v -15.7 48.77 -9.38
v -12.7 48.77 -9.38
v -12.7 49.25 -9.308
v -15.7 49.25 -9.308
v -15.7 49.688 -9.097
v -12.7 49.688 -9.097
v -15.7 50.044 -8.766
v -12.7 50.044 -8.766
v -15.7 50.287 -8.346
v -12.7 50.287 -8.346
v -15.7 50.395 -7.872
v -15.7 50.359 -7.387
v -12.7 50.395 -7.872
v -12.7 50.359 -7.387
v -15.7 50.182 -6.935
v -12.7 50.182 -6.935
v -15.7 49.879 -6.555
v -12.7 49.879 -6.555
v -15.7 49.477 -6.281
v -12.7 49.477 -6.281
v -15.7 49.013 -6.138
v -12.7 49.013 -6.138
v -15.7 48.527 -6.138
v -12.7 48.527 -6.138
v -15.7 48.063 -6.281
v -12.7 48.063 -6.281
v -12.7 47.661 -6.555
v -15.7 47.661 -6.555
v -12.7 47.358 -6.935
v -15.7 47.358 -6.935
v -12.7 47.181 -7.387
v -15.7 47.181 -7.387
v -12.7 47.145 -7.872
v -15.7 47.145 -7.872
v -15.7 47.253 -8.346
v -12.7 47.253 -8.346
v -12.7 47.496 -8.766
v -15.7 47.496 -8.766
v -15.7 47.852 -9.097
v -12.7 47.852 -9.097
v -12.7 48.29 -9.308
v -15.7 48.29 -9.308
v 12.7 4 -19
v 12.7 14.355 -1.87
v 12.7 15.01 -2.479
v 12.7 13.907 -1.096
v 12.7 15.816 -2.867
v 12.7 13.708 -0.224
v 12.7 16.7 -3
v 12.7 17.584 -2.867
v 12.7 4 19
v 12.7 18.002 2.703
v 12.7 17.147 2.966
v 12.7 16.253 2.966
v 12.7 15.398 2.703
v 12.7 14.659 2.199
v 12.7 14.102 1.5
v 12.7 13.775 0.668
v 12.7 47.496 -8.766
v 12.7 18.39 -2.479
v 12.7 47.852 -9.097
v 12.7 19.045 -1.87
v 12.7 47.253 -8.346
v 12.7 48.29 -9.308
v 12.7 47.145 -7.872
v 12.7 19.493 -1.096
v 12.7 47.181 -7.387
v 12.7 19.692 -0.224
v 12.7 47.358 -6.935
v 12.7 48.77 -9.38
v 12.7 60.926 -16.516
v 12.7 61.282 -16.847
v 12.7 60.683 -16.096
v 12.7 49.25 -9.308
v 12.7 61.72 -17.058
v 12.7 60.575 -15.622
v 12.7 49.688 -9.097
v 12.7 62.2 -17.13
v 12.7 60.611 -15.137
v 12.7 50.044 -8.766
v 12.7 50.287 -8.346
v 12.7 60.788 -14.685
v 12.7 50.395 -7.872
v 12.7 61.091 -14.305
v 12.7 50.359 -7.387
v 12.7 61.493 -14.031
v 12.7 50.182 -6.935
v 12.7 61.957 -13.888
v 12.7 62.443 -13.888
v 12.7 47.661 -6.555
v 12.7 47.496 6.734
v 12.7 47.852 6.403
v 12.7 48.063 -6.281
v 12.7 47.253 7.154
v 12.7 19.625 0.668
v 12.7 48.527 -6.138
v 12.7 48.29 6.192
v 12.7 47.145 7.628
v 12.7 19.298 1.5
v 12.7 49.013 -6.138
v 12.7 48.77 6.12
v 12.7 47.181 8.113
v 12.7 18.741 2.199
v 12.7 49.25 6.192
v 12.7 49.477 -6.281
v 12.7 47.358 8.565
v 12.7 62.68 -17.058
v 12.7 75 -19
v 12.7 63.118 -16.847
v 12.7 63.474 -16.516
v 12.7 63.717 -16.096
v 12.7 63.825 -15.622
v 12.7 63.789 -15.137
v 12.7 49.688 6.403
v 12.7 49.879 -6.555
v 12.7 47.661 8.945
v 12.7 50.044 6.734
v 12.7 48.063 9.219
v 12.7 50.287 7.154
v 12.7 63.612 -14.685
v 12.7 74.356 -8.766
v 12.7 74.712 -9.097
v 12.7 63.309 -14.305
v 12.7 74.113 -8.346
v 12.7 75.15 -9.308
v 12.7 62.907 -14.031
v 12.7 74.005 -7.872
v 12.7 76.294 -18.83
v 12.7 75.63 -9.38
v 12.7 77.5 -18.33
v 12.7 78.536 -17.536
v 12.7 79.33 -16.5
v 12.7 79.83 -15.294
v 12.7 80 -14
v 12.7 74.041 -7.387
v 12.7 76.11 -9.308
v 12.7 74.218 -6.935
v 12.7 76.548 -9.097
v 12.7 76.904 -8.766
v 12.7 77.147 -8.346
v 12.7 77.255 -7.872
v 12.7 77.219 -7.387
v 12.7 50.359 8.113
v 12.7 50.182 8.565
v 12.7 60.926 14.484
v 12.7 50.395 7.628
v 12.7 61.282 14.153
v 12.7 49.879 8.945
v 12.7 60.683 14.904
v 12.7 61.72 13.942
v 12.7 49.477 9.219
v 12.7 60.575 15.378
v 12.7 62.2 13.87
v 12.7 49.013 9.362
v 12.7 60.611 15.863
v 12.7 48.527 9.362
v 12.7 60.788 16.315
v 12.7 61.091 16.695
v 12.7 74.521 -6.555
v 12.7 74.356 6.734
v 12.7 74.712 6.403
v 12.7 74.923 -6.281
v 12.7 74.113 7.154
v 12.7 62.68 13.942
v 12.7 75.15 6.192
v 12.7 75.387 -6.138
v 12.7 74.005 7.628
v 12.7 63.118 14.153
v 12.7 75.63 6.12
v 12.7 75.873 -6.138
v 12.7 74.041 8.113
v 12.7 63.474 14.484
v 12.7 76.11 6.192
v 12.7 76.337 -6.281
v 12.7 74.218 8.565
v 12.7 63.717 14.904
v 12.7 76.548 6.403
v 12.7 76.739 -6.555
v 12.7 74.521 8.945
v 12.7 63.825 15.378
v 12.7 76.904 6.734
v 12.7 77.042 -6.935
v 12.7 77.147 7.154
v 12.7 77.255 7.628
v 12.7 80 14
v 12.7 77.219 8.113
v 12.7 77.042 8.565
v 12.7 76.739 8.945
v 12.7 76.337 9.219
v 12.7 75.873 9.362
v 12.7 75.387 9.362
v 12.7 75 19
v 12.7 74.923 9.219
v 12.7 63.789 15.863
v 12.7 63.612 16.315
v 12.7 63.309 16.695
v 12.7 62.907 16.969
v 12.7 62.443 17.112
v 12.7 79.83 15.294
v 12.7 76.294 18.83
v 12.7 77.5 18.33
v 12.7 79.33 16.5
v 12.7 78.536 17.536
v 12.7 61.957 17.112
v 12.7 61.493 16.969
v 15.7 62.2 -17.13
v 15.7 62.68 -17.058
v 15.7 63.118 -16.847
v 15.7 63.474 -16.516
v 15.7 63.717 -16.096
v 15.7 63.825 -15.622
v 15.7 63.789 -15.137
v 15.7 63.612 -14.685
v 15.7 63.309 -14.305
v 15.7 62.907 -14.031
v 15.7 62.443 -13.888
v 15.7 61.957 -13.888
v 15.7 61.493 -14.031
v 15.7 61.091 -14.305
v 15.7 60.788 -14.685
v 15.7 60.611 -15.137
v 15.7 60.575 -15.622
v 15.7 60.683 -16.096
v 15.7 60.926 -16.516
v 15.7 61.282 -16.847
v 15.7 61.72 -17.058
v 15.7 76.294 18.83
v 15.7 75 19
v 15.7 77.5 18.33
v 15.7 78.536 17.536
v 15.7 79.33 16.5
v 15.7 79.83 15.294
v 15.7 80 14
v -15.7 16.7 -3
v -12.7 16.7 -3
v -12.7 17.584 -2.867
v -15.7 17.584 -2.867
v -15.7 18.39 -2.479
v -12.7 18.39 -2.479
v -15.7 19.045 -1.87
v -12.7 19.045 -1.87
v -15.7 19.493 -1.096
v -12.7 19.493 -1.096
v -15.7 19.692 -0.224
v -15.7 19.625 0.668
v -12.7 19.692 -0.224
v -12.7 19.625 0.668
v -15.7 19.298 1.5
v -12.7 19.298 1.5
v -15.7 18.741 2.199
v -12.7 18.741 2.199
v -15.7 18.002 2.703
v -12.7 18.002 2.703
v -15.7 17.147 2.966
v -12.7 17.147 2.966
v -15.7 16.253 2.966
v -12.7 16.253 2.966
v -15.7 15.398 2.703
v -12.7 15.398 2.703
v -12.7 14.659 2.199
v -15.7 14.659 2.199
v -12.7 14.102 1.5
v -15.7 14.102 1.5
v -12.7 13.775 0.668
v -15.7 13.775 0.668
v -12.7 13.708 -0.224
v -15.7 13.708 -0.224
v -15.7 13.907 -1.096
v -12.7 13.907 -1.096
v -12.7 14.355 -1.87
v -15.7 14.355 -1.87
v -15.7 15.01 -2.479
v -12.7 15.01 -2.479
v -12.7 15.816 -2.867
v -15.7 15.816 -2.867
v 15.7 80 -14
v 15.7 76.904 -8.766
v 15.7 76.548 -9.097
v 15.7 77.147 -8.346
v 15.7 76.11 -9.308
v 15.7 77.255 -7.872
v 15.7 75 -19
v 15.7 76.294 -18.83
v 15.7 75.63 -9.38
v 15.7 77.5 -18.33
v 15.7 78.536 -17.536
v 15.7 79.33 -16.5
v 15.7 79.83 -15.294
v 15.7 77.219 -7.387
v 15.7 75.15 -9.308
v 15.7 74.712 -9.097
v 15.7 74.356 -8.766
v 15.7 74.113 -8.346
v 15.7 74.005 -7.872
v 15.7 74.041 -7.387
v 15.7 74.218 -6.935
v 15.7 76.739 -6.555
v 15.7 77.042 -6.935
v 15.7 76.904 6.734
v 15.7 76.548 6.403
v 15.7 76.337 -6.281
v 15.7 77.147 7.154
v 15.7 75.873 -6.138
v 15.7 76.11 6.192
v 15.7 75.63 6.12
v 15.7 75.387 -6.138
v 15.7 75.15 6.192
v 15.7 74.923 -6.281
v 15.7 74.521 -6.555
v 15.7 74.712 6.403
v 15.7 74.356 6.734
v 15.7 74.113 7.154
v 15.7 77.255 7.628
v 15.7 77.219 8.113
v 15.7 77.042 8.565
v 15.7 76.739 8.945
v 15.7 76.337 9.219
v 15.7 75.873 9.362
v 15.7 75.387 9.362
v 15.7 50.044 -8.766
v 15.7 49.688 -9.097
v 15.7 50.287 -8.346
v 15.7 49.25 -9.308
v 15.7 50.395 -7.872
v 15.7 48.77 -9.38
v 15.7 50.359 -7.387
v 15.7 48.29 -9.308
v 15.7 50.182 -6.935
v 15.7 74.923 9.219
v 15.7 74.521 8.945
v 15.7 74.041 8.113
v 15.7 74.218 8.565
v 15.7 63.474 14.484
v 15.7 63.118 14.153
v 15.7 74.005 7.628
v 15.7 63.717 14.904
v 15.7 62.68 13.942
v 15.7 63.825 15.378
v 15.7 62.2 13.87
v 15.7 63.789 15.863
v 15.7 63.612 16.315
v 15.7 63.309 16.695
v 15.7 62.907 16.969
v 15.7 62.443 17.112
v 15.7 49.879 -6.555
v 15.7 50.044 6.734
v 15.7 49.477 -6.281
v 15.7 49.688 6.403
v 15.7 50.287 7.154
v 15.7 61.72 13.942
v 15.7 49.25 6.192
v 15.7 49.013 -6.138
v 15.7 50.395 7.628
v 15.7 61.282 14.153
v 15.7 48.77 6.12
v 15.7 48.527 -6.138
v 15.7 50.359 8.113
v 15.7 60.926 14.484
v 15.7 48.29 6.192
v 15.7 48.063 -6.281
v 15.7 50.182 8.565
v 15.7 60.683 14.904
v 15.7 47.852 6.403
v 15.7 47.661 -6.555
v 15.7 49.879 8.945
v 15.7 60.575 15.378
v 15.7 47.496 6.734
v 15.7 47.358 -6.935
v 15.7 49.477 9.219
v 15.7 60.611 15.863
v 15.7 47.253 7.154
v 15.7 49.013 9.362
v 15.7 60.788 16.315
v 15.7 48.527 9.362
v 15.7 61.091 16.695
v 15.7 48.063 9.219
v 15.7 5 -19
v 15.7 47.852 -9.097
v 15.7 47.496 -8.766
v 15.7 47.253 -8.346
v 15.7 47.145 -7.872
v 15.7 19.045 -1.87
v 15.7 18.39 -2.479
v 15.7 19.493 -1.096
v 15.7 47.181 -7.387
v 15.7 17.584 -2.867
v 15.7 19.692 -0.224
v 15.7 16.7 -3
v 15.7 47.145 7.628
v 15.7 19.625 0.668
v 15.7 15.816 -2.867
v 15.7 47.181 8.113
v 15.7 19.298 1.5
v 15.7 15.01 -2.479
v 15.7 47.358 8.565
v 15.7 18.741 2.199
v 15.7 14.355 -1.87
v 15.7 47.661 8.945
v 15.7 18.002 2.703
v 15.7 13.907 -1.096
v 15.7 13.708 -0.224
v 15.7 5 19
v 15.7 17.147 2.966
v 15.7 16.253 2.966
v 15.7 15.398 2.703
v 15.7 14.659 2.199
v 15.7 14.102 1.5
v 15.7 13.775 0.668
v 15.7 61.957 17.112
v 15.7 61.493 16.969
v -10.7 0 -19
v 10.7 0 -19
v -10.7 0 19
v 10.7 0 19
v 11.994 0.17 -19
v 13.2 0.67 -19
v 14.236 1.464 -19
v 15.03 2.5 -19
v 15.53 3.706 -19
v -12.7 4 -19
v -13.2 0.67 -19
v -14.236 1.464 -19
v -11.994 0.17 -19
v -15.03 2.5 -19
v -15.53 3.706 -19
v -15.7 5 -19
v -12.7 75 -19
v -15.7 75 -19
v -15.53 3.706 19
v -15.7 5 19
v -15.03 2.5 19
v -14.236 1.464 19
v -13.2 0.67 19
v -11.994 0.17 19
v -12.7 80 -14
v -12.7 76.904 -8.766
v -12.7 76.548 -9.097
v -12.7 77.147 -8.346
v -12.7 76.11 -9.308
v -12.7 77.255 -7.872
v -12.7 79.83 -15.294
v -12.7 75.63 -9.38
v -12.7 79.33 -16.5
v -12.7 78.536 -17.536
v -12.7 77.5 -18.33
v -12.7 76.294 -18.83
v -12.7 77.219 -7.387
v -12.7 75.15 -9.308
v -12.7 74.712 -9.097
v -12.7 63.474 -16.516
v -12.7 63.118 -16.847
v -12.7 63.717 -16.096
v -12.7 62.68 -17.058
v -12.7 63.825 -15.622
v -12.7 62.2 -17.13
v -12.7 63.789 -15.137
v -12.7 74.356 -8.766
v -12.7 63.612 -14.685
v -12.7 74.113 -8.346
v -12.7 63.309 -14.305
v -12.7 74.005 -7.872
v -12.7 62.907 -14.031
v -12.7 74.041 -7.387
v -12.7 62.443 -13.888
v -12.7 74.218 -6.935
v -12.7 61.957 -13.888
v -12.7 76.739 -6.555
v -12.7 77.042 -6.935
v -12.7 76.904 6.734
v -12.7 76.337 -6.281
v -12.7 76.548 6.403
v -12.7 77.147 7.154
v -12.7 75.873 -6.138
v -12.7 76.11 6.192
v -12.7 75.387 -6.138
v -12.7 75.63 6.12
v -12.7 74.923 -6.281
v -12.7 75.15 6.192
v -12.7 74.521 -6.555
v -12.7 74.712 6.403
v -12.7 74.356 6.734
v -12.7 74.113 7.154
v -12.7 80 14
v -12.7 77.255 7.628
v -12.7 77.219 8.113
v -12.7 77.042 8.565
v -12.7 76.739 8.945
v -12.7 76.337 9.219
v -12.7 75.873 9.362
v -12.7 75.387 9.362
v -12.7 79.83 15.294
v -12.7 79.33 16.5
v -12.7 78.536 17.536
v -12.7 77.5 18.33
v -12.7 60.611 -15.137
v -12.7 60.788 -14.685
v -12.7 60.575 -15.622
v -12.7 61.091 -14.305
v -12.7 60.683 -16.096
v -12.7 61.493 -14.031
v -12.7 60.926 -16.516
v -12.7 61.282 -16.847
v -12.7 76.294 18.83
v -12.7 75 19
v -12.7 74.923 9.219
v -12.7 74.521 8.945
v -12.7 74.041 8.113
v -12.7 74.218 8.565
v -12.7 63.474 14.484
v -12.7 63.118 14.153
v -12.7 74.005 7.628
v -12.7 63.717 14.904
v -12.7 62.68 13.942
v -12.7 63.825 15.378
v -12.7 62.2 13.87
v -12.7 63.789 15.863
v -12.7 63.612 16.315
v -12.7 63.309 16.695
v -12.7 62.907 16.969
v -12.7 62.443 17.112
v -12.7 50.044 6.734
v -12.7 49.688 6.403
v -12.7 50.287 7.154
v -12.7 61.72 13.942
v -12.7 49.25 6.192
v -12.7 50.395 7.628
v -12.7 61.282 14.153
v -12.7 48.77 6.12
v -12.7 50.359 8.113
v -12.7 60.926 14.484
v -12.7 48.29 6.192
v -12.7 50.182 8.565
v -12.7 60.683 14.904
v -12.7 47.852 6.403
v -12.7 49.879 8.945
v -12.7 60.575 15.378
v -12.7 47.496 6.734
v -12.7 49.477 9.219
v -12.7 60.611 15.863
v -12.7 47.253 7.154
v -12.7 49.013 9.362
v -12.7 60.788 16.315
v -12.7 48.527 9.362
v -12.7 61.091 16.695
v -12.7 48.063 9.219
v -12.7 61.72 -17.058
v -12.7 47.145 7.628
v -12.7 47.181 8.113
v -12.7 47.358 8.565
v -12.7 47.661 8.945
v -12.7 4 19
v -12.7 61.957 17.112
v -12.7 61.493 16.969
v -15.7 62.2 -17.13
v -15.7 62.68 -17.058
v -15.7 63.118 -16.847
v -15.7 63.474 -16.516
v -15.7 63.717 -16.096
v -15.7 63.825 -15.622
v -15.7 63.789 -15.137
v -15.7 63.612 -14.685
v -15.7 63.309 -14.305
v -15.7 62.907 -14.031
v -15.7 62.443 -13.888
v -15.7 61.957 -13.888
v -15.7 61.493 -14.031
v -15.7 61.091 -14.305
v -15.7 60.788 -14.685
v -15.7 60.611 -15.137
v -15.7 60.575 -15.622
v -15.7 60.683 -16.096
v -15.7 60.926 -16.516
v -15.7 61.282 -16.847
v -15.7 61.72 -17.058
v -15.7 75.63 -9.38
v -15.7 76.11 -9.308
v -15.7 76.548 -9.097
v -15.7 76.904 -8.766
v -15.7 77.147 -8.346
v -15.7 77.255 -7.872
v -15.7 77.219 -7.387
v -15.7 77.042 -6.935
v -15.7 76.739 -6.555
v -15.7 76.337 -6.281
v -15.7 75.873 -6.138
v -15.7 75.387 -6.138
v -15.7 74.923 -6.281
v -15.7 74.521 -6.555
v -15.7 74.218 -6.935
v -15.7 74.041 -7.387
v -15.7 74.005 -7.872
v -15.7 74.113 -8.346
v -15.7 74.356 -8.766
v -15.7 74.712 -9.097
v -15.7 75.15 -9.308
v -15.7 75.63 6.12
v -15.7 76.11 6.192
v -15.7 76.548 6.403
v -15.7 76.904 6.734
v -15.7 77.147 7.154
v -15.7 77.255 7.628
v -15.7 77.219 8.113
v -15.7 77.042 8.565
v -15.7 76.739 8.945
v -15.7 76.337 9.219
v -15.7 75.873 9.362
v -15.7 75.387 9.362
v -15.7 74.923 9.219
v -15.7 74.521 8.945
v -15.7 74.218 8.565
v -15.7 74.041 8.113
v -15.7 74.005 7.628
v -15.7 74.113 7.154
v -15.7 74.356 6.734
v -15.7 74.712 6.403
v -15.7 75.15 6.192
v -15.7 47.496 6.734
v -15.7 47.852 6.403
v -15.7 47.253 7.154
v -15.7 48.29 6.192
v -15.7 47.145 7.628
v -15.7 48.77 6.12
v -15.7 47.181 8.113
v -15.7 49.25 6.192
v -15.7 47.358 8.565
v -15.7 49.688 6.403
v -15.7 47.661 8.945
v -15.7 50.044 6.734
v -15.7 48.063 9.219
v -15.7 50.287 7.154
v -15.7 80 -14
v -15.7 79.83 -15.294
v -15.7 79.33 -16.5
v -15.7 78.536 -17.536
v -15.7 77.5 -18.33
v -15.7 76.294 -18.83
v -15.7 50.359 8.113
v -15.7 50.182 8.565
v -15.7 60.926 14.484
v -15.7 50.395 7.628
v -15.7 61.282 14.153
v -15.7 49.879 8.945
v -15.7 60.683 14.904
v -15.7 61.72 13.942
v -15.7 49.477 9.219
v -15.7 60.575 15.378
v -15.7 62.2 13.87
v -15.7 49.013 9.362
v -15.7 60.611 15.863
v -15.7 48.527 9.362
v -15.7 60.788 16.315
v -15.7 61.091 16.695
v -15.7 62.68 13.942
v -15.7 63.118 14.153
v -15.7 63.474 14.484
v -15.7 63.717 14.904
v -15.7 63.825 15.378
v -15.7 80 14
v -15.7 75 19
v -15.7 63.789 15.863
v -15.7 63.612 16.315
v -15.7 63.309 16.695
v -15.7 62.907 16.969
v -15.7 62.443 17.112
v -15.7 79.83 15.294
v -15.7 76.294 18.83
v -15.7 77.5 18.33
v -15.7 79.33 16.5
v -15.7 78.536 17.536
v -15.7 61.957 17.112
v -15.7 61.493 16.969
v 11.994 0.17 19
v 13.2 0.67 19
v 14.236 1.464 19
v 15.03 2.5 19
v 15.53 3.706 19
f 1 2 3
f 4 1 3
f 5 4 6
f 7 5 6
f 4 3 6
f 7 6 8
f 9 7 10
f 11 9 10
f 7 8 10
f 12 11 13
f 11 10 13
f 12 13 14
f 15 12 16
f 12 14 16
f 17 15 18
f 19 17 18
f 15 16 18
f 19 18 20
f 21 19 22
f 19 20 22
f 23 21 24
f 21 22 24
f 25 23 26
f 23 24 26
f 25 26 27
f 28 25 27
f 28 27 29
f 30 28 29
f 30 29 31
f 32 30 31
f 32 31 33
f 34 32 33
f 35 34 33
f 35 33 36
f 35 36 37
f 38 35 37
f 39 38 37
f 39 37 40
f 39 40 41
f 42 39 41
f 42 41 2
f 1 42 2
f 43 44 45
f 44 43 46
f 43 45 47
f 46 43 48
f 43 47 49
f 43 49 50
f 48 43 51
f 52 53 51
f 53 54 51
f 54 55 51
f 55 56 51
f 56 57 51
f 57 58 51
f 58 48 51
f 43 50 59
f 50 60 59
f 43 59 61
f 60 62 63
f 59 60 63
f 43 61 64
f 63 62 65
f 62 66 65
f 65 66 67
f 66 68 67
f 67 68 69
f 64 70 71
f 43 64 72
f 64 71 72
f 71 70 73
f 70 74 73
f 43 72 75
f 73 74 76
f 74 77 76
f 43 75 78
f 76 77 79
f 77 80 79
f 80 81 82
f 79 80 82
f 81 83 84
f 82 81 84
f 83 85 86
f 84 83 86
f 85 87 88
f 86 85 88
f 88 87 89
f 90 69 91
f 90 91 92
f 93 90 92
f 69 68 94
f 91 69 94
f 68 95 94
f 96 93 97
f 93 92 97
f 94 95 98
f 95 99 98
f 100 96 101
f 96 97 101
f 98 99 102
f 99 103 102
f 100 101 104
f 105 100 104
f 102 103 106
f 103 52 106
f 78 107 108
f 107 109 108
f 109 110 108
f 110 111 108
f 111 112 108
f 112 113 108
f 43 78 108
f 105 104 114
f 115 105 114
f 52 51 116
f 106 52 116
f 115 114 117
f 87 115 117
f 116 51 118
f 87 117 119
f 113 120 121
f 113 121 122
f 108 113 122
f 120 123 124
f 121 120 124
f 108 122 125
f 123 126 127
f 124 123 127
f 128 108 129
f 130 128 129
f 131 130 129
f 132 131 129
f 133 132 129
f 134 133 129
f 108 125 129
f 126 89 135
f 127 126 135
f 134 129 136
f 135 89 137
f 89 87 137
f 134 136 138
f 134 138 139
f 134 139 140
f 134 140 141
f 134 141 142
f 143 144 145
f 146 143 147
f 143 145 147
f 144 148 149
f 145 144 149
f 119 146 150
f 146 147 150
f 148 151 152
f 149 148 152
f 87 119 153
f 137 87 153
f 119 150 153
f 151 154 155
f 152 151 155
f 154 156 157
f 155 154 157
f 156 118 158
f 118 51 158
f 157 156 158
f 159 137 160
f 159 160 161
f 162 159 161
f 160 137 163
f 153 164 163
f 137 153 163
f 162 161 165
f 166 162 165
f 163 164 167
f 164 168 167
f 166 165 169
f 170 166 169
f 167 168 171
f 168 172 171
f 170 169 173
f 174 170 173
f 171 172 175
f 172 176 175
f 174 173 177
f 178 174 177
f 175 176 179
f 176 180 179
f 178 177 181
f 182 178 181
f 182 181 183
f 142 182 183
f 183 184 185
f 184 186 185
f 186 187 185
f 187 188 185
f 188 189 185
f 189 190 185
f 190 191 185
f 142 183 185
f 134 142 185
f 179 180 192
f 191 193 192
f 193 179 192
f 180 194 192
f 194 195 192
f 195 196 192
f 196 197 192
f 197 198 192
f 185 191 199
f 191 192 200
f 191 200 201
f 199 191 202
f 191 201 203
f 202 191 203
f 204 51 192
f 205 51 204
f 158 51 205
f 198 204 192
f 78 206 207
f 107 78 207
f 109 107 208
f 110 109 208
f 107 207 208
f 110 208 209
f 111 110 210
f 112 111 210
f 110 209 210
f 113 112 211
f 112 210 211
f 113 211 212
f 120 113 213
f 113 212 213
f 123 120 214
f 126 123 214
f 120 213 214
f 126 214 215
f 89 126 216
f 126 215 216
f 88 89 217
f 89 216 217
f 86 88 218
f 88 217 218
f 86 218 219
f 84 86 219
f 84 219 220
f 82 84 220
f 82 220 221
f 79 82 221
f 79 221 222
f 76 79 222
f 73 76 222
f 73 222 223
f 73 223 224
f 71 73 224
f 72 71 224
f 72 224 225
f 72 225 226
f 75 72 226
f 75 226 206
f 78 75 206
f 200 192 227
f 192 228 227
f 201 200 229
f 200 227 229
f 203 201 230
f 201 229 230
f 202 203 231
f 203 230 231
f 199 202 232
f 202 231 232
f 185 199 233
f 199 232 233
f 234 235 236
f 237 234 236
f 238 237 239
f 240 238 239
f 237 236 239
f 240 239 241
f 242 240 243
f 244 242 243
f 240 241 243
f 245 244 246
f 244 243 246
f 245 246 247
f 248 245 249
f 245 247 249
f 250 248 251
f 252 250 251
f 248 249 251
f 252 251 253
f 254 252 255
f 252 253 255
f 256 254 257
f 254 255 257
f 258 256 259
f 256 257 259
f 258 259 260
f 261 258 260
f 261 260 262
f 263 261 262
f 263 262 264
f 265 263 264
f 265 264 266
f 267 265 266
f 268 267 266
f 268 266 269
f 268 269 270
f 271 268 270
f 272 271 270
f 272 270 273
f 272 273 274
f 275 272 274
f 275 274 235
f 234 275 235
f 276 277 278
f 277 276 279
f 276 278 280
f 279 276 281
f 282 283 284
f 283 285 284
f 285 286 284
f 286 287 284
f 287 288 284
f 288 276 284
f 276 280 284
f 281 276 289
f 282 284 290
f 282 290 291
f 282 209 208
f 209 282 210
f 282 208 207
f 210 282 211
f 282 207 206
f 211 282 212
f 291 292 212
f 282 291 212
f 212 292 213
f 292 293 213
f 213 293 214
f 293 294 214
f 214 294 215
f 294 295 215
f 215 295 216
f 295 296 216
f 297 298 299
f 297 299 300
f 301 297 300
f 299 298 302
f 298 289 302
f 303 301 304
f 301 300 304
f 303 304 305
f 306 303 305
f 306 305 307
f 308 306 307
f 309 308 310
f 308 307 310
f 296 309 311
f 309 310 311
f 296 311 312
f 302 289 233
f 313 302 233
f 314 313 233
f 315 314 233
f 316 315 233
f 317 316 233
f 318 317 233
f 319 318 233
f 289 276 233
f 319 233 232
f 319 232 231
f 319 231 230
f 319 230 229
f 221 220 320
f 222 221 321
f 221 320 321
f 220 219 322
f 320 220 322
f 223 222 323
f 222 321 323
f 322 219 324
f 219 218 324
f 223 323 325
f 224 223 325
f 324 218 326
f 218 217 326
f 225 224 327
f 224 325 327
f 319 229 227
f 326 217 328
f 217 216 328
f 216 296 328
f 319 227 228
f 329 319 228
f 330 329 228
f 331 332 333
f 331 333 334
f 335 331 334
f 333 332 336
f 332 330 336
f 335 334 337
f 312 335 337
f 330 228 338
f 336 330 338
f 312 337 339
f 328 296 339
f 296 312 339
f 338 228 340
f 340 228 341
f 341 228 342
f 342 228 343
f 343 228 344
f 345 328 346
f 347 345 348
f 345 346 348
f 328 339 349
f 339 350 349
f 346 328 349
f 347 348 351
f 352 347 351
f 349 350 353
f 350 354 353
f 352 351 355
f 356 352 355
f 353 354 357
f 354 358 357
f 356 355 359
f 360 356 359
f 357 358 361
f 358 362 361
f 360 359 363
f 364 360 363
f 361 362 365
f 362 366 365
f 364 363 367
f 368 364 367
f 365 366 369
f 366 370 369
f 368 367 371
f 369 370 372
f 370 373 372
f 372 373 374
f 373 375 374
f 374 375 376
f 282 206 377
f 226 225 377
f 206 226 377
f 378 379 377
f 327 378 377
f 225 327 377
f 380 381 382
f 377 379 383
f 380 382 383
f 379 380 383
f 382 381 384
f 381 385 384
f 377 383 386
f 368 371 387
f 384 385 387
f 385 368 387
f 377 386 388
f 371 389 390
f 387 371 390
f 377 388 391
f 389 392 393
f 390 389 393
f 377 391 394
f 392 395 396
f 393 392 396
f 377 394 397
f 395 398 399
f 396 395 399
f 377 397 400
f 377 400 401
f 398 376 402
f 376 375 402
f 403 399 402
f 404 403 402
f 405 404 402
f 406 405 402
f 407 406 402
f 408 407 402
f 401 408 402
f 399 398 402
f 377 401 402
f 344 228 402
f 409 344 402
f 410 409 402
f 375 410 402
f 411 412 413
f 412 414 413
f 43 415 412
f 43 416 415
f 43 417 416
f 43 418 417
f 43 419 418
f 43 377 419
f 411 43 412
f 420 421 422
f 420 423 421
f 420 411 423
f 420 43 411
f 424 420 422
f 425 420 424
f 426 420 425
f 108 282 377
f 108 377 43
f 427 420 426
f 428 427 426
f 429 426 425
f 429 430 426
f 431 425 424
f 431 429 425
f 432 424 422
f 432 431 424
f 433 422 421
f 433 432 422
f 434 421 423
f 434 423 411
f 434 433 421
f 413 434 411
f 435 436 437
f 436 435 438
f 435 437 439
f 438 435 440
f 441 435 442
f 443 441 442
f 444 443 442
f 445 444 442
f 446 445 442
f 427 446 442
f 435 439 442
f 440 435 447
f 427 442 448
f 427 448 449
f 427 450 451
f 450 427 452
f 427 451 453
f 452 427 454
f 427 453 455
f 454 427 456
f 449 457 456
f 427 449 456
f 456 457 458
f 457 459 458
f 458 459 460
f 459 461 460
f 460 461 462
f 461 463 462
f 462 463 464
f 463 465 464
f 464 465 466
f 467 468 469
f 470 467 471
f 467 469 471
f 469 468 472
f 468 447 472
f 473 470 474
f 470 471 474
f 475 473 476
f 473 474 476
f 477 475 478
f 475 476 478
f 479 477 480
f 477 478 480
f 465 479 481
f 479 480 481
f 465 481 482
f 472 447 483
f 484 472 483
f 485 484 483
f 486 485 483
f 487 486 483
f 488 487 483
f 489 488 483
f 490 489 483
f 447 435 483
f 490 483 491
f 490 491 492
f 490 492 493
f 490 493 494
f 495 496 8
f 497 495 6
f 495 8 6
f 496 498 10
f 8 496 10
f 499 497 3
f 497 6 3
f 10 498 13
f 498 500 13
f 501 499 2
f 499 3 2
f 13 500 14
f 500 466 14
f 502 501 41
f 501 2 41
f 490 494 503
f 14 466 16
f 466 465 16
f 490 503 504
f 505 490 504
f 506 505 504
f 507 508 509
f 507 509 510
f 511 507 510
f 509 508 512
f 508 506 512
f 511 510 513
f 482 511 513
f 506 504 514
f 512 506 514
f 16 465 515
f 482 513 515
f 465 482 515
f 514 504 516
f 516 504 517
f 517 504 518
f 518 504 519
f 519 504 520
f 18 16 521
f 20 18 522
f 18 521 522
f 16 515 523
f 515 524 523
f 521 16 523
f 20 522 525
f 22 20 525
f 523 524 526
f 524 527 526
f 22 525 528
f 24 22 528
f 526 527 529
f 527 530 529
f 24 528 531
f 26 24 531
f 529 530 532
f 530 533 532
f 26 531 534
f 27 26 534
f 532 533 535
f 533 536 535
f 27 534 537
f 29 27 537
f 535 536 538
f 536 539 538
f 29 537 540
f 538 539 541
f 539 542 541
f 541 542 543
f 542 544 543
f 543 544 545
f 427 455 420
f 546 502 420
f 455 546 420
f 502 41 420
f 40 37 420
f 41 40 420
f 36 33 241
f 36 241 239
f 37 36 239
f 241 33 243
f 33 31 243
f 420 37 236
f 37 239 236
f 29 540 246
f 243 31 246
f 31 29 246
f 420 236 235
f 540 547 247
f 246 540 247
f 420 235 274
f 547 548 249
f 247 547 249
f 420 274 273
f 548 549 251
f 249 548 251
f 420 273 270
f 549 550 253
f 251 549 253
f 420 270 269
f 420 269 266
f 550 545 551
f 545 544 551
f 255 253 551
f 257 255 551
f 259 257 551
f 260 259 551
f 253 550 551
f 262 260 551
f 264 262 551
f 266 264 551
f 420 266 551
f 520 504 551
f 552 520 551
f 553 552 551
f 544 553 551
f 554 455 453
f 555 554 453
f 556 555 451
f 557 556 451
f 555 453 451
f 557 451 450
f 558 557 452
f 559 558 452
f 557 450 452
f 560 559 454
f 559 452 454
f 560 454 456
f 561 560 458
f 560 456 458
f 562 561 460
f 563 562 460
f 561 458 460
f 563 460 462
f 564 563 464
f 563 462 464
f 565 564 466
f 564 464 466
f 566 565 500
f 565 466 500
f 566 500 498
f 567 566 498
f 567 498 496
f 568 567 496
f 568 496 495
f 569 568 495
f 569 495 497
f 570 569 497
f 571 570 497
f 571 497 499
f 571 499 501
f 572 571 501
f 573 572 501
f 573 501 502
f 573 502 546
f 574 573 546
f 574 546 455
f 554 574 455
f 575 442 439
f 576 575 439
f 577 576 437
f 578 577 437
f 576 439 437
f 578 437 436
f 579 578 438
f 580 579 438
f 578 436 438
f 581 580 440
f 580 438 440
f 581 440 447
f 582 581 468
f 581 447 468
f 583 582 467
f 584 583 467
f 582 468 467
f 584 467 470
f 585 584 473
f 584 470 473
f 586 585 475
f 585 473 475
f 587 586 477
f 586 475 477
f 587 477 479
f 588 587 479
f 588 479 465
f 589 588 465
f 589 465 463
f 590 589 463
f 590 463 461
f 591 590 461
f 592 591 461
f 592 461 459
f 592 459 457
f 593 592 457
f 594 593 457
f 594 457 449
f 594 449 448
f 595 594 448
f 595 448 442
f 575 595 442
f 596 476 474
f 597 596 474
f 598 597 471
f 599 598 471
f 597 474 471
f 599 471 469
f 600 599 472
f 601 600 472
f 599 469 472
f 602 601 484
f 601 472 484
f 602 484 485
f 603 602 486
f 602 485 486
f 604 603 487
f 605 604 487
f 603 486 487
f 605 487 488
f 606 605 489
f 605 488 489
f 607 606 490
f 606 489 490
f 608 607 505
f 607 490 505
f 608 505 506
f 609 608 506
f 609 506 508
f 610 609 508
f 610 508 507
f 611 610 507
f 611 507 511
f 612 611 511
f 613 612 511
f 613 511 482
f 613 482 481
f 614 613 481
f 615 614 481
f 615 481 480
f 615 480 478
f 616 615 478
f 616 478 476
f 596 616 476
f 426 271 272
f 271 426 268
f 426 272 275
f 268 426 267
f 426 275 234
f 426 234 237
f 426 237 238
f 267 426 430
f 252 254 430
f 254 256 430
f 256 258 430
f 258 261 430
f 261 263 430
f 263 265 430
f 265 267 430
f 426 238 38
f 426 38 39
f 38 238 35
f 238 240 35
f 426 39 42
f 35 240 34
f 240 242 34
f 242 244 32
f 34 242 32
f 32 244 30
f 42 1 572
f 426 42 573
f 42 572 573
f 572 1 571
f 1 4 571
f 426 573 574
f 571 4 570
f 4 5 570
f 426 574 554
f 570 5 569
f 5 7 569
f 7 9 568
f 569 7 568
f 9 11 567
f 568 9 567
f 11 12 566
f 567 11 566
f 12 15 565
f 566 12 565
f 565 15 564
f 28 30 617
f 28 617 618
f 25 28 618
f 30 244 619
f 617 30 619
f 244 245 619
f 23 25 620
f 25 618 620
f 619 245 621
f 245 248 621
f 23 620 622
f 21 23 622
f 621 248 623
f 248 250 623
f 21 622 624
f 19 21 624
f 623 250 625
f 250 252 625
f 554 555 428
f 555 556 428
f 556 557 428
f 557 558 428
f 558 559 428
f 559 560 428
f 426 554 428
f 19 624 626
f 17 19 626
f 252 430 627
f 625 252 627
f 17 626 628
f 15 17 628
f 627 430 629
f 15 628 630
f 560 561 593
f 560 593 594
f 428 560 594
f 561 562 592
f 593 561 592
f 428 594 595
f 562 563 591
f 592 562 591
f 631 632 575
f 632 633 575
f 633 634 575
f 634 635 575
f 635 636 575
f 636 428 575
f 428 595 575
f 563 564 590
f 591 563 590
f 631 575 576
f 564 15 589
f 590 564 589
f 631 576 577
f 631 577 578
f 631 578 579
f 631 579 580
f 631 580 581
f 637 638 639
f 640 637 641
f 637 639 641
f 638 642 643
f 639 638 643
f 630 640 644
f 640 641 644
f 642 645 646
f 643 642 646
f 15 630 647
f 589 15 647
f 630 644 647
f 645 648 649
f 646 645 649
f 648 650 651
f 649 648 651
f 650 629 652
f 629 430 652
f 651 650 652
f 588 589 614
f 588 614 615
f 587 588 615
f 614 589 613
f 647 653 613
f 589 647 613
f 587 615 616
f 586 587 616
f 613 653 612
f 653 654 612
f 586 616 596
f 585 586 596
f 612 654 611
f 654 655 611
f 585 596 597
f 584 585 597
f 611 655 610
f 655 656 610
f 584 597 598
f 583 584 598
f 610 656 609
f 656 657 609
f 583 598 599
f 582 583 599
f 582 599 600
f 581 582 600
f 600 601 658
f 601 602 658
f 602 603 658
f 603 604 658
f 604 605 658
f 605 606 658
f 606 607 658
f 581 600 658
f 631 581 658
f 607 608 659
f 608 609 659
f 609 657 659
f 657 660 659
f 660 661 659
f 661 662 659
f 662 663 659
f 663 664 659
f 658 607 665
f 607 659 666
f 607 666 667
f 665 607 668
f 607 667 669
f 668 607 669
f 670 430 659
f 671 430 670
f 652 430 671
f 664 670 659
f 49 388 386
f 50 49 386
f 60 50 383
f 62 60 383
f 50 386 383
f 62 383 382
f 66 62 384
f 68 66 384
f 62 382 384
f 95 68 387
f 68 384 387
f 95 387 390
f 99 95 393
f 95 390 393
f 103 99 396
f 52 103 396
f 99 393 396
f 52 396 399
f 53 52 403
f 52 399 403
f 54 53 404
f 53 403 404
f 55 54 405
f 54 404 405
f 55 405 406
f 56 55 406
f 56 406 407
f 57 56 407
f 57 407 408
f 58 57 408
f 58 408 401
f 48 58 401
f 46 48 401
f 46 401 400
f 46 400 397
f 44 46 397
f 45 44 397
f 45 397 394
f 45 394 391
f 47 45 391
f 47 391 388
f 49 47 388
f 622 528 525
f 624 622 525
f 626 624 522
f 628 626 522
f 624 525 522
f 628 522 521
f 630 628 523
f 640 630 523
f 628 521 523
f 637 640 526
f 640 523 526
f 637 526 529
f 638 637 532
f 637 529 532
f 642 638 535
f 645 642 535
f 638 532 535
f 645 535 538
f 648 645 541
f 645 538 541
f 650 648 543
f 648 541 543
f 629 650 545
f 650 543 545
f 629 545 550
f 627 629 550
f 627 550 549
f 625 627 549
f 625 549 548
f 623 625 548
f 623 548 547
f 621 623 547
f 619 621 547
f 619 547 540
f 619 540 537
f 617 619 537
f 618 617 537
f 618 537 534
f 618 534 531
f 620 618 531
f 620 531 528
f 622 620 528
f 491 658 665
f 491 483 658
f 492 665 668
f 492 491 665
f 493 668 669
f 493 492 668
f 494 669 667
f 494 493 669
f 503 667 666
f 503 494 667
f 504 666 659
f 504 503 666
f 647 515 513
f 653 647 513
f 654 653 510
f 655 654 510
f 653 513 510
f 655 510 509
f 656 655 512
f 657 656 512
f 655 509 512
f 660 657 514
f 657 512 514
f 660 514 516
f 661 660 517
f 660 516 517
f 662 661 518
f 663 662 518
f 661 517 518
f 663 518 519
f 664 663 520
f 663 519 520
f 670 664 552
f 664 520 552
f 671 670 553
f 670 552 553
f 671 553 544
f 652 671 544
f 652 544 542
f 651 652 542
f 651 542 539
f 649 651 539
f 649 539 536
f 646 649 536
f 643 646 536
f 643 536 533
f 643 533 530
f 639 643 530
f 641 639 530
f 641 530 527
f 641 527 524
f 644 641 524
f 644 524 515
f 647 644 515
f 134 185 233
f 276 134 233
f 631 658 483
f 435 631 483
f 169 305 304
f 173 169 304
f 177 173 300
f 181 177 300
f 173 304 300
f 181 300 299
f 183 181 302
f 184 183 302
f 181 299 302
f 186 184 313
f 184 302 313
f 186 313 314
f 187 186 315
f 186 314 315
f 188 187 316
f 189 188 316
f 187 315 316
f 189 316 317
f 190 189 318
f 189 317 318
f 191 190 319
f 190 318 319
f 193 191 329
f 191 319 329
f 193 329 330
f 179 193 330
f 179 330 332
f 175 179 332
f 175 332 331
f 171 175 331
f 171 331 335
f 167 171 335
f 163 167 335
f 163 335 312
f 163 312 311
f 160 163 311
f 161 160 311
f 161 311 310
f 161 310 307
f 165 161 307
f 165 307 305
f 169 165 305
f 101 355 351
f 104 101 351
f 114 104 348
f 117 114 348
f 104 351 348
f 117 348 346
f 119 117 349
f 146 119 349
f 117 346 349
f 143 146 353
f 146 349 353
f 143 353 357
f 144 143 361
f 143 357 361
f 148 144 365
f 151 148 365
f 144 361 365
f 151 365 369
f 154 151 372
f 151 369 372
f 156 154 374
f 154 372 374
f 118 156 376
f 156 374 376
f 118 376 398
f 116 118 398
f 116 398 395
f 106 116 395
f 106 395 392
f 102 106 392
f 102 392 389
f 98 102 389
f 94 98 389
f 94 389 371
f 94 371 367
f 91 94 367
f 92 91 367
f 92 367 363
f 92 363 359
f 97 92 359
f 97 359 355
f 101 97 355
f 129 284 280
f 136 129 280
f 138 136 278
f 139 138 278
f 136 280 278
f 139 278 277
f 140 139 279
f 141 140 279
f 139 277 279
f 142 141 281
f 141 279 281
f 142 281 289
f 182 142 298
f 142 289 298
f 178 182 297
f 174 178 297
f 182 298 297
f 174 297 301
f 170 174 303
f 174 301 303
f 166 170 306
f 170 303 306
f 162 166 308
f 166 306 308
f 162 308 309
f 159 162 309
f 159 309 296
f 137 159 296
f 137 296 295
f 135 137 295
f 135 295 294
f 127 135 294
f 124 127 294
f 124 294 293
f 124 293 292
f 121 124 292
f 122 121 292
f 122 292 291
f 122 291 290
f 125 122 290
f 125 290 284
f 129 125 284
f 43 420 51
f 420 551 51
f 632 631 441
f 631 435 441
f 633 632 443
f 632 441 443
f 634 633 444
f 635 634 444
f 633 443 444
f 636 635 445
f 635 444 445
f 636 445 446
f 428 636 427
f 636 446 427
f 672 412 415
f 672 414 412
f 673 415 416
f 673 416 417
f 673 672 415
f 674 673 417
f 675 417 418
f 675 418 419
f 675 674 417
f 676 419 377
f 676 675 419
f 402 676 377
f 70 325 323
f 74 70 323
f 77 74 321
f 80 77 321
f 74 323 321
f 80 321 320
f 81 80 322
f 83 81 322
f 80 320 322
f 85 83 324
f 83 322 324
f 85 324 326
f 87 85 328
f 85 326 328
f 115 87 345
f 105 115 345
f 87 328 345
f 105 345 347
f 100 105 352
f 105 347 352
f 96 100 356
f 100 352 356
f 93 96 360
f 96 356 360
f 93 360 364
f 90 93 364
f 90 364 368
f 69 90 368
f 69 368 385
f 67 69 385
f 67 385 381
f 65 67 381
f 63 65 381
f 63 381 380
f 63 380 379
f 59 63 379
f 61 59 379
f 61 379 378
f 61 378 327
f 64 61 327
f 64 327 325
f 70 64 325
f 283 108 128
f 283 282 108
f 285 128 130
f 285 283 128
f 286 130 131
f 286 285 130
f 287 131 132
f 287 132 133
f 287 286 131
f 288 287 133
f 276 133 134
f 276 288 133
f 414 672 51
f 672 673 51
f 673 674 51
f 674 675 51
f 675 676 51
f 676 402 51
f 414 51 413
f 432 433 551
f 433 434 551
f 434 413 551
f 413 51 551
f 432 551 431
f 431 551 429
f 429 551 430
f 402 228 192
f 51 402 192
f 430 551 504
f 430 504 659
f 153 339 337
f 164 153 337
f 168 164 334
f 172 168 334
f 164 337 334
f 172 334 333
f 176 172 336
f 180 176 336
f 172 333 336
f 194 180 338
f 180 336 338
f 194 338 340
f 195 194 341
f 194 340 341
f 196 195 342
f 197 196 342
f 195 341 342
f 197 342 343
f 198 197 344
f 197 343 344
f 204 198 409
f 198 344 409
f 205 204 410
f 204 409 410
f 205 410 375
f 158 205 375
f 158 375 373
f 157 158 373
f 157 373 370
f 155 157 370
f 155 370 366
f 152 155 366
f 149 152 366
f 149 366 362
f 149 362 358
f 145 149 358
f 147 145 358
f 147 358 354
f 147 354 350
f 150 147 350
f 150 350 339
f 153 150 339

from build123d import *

# Parameters (mm, degrees)
BOSS_EXTRUDE1_DEPTH = 19
SKETCH2_R           = 1.63
CUT_EXTRUDE1_DEPTH  = 32.4
FILLET1_R           = 5
SKETCH4_R           = 3
CUT_EXTRUDE3_DEPTH  = 32.4


with BuildPart() as part:
    # Sketch1 → Boss-Extrude1 (new body, symmetric)
    with BuildSketch(Plane.XY):
        Polygon((-15.7, 80), (-12.7, 80), (-12.7, 4), (12.7, 4), (12.7, 80), (15.7, 80), (15.7, 0), (-15.7, 0), align=None)
    extrude(amount=BOSS_EXTRUDE1_DEPTH, both=True)

    # Sketch2 → Cut-Extrude1 (cut, through all)
    with BuildSketch(Plane(origin=(15.7, 0, 0), x_dir=(0, 0, -1), z_dir=(1, 0, 0))):
        with Locations((-7.75, 75.63)):
            Circle(SKETCH2_R)
        with Locations((7.75, 75.63)):
            Circle(SKETCH2_R)
        with Locations((-15.5, 62.2)):
            Circle(SKETCH2_R)
        with Locations((15.5, 62.2)):
            Circle(SKETCH2_R)
        with Locations((-7.75, 48.77)):
            Circle(SKETCH2_R)
        with Locations((7.75, 48.77)):
            Circle(SKETCH2_R)
    extrude(amount=-CUT_EXTRUDE1_DEPTH, mode=Mode.SUBTRACT)

    # Fillet1
    fillet1_edges = [part.edges().sort_by_distance(p)[0] for p in [
        (14.2, 80, -19),
        (15.7, 0, 0),
        (-15.7, 0, 0),
        (14.2, 80, 19),
        (-14.2, 80, 19),
        (-14.2, 80, -19),
    ]]
    fillet(fillet1_edges, radius=FILLET1_R)

    # Sketch4 → Cut-Extrude3 (cut, through all)
    with BuildSketch(Plane(origin=(15.7, 0, 0), x_dir=(0, 0, -1), z_dir=(1, 0, 0))):
        with Locations((0, 16.7)):
            Circle(SKETCH4_R)
    extrude(amount=-CUT_EXTRUDE3_DEPTH, mode=Mode.SUBTRACT)


solid = part.part
